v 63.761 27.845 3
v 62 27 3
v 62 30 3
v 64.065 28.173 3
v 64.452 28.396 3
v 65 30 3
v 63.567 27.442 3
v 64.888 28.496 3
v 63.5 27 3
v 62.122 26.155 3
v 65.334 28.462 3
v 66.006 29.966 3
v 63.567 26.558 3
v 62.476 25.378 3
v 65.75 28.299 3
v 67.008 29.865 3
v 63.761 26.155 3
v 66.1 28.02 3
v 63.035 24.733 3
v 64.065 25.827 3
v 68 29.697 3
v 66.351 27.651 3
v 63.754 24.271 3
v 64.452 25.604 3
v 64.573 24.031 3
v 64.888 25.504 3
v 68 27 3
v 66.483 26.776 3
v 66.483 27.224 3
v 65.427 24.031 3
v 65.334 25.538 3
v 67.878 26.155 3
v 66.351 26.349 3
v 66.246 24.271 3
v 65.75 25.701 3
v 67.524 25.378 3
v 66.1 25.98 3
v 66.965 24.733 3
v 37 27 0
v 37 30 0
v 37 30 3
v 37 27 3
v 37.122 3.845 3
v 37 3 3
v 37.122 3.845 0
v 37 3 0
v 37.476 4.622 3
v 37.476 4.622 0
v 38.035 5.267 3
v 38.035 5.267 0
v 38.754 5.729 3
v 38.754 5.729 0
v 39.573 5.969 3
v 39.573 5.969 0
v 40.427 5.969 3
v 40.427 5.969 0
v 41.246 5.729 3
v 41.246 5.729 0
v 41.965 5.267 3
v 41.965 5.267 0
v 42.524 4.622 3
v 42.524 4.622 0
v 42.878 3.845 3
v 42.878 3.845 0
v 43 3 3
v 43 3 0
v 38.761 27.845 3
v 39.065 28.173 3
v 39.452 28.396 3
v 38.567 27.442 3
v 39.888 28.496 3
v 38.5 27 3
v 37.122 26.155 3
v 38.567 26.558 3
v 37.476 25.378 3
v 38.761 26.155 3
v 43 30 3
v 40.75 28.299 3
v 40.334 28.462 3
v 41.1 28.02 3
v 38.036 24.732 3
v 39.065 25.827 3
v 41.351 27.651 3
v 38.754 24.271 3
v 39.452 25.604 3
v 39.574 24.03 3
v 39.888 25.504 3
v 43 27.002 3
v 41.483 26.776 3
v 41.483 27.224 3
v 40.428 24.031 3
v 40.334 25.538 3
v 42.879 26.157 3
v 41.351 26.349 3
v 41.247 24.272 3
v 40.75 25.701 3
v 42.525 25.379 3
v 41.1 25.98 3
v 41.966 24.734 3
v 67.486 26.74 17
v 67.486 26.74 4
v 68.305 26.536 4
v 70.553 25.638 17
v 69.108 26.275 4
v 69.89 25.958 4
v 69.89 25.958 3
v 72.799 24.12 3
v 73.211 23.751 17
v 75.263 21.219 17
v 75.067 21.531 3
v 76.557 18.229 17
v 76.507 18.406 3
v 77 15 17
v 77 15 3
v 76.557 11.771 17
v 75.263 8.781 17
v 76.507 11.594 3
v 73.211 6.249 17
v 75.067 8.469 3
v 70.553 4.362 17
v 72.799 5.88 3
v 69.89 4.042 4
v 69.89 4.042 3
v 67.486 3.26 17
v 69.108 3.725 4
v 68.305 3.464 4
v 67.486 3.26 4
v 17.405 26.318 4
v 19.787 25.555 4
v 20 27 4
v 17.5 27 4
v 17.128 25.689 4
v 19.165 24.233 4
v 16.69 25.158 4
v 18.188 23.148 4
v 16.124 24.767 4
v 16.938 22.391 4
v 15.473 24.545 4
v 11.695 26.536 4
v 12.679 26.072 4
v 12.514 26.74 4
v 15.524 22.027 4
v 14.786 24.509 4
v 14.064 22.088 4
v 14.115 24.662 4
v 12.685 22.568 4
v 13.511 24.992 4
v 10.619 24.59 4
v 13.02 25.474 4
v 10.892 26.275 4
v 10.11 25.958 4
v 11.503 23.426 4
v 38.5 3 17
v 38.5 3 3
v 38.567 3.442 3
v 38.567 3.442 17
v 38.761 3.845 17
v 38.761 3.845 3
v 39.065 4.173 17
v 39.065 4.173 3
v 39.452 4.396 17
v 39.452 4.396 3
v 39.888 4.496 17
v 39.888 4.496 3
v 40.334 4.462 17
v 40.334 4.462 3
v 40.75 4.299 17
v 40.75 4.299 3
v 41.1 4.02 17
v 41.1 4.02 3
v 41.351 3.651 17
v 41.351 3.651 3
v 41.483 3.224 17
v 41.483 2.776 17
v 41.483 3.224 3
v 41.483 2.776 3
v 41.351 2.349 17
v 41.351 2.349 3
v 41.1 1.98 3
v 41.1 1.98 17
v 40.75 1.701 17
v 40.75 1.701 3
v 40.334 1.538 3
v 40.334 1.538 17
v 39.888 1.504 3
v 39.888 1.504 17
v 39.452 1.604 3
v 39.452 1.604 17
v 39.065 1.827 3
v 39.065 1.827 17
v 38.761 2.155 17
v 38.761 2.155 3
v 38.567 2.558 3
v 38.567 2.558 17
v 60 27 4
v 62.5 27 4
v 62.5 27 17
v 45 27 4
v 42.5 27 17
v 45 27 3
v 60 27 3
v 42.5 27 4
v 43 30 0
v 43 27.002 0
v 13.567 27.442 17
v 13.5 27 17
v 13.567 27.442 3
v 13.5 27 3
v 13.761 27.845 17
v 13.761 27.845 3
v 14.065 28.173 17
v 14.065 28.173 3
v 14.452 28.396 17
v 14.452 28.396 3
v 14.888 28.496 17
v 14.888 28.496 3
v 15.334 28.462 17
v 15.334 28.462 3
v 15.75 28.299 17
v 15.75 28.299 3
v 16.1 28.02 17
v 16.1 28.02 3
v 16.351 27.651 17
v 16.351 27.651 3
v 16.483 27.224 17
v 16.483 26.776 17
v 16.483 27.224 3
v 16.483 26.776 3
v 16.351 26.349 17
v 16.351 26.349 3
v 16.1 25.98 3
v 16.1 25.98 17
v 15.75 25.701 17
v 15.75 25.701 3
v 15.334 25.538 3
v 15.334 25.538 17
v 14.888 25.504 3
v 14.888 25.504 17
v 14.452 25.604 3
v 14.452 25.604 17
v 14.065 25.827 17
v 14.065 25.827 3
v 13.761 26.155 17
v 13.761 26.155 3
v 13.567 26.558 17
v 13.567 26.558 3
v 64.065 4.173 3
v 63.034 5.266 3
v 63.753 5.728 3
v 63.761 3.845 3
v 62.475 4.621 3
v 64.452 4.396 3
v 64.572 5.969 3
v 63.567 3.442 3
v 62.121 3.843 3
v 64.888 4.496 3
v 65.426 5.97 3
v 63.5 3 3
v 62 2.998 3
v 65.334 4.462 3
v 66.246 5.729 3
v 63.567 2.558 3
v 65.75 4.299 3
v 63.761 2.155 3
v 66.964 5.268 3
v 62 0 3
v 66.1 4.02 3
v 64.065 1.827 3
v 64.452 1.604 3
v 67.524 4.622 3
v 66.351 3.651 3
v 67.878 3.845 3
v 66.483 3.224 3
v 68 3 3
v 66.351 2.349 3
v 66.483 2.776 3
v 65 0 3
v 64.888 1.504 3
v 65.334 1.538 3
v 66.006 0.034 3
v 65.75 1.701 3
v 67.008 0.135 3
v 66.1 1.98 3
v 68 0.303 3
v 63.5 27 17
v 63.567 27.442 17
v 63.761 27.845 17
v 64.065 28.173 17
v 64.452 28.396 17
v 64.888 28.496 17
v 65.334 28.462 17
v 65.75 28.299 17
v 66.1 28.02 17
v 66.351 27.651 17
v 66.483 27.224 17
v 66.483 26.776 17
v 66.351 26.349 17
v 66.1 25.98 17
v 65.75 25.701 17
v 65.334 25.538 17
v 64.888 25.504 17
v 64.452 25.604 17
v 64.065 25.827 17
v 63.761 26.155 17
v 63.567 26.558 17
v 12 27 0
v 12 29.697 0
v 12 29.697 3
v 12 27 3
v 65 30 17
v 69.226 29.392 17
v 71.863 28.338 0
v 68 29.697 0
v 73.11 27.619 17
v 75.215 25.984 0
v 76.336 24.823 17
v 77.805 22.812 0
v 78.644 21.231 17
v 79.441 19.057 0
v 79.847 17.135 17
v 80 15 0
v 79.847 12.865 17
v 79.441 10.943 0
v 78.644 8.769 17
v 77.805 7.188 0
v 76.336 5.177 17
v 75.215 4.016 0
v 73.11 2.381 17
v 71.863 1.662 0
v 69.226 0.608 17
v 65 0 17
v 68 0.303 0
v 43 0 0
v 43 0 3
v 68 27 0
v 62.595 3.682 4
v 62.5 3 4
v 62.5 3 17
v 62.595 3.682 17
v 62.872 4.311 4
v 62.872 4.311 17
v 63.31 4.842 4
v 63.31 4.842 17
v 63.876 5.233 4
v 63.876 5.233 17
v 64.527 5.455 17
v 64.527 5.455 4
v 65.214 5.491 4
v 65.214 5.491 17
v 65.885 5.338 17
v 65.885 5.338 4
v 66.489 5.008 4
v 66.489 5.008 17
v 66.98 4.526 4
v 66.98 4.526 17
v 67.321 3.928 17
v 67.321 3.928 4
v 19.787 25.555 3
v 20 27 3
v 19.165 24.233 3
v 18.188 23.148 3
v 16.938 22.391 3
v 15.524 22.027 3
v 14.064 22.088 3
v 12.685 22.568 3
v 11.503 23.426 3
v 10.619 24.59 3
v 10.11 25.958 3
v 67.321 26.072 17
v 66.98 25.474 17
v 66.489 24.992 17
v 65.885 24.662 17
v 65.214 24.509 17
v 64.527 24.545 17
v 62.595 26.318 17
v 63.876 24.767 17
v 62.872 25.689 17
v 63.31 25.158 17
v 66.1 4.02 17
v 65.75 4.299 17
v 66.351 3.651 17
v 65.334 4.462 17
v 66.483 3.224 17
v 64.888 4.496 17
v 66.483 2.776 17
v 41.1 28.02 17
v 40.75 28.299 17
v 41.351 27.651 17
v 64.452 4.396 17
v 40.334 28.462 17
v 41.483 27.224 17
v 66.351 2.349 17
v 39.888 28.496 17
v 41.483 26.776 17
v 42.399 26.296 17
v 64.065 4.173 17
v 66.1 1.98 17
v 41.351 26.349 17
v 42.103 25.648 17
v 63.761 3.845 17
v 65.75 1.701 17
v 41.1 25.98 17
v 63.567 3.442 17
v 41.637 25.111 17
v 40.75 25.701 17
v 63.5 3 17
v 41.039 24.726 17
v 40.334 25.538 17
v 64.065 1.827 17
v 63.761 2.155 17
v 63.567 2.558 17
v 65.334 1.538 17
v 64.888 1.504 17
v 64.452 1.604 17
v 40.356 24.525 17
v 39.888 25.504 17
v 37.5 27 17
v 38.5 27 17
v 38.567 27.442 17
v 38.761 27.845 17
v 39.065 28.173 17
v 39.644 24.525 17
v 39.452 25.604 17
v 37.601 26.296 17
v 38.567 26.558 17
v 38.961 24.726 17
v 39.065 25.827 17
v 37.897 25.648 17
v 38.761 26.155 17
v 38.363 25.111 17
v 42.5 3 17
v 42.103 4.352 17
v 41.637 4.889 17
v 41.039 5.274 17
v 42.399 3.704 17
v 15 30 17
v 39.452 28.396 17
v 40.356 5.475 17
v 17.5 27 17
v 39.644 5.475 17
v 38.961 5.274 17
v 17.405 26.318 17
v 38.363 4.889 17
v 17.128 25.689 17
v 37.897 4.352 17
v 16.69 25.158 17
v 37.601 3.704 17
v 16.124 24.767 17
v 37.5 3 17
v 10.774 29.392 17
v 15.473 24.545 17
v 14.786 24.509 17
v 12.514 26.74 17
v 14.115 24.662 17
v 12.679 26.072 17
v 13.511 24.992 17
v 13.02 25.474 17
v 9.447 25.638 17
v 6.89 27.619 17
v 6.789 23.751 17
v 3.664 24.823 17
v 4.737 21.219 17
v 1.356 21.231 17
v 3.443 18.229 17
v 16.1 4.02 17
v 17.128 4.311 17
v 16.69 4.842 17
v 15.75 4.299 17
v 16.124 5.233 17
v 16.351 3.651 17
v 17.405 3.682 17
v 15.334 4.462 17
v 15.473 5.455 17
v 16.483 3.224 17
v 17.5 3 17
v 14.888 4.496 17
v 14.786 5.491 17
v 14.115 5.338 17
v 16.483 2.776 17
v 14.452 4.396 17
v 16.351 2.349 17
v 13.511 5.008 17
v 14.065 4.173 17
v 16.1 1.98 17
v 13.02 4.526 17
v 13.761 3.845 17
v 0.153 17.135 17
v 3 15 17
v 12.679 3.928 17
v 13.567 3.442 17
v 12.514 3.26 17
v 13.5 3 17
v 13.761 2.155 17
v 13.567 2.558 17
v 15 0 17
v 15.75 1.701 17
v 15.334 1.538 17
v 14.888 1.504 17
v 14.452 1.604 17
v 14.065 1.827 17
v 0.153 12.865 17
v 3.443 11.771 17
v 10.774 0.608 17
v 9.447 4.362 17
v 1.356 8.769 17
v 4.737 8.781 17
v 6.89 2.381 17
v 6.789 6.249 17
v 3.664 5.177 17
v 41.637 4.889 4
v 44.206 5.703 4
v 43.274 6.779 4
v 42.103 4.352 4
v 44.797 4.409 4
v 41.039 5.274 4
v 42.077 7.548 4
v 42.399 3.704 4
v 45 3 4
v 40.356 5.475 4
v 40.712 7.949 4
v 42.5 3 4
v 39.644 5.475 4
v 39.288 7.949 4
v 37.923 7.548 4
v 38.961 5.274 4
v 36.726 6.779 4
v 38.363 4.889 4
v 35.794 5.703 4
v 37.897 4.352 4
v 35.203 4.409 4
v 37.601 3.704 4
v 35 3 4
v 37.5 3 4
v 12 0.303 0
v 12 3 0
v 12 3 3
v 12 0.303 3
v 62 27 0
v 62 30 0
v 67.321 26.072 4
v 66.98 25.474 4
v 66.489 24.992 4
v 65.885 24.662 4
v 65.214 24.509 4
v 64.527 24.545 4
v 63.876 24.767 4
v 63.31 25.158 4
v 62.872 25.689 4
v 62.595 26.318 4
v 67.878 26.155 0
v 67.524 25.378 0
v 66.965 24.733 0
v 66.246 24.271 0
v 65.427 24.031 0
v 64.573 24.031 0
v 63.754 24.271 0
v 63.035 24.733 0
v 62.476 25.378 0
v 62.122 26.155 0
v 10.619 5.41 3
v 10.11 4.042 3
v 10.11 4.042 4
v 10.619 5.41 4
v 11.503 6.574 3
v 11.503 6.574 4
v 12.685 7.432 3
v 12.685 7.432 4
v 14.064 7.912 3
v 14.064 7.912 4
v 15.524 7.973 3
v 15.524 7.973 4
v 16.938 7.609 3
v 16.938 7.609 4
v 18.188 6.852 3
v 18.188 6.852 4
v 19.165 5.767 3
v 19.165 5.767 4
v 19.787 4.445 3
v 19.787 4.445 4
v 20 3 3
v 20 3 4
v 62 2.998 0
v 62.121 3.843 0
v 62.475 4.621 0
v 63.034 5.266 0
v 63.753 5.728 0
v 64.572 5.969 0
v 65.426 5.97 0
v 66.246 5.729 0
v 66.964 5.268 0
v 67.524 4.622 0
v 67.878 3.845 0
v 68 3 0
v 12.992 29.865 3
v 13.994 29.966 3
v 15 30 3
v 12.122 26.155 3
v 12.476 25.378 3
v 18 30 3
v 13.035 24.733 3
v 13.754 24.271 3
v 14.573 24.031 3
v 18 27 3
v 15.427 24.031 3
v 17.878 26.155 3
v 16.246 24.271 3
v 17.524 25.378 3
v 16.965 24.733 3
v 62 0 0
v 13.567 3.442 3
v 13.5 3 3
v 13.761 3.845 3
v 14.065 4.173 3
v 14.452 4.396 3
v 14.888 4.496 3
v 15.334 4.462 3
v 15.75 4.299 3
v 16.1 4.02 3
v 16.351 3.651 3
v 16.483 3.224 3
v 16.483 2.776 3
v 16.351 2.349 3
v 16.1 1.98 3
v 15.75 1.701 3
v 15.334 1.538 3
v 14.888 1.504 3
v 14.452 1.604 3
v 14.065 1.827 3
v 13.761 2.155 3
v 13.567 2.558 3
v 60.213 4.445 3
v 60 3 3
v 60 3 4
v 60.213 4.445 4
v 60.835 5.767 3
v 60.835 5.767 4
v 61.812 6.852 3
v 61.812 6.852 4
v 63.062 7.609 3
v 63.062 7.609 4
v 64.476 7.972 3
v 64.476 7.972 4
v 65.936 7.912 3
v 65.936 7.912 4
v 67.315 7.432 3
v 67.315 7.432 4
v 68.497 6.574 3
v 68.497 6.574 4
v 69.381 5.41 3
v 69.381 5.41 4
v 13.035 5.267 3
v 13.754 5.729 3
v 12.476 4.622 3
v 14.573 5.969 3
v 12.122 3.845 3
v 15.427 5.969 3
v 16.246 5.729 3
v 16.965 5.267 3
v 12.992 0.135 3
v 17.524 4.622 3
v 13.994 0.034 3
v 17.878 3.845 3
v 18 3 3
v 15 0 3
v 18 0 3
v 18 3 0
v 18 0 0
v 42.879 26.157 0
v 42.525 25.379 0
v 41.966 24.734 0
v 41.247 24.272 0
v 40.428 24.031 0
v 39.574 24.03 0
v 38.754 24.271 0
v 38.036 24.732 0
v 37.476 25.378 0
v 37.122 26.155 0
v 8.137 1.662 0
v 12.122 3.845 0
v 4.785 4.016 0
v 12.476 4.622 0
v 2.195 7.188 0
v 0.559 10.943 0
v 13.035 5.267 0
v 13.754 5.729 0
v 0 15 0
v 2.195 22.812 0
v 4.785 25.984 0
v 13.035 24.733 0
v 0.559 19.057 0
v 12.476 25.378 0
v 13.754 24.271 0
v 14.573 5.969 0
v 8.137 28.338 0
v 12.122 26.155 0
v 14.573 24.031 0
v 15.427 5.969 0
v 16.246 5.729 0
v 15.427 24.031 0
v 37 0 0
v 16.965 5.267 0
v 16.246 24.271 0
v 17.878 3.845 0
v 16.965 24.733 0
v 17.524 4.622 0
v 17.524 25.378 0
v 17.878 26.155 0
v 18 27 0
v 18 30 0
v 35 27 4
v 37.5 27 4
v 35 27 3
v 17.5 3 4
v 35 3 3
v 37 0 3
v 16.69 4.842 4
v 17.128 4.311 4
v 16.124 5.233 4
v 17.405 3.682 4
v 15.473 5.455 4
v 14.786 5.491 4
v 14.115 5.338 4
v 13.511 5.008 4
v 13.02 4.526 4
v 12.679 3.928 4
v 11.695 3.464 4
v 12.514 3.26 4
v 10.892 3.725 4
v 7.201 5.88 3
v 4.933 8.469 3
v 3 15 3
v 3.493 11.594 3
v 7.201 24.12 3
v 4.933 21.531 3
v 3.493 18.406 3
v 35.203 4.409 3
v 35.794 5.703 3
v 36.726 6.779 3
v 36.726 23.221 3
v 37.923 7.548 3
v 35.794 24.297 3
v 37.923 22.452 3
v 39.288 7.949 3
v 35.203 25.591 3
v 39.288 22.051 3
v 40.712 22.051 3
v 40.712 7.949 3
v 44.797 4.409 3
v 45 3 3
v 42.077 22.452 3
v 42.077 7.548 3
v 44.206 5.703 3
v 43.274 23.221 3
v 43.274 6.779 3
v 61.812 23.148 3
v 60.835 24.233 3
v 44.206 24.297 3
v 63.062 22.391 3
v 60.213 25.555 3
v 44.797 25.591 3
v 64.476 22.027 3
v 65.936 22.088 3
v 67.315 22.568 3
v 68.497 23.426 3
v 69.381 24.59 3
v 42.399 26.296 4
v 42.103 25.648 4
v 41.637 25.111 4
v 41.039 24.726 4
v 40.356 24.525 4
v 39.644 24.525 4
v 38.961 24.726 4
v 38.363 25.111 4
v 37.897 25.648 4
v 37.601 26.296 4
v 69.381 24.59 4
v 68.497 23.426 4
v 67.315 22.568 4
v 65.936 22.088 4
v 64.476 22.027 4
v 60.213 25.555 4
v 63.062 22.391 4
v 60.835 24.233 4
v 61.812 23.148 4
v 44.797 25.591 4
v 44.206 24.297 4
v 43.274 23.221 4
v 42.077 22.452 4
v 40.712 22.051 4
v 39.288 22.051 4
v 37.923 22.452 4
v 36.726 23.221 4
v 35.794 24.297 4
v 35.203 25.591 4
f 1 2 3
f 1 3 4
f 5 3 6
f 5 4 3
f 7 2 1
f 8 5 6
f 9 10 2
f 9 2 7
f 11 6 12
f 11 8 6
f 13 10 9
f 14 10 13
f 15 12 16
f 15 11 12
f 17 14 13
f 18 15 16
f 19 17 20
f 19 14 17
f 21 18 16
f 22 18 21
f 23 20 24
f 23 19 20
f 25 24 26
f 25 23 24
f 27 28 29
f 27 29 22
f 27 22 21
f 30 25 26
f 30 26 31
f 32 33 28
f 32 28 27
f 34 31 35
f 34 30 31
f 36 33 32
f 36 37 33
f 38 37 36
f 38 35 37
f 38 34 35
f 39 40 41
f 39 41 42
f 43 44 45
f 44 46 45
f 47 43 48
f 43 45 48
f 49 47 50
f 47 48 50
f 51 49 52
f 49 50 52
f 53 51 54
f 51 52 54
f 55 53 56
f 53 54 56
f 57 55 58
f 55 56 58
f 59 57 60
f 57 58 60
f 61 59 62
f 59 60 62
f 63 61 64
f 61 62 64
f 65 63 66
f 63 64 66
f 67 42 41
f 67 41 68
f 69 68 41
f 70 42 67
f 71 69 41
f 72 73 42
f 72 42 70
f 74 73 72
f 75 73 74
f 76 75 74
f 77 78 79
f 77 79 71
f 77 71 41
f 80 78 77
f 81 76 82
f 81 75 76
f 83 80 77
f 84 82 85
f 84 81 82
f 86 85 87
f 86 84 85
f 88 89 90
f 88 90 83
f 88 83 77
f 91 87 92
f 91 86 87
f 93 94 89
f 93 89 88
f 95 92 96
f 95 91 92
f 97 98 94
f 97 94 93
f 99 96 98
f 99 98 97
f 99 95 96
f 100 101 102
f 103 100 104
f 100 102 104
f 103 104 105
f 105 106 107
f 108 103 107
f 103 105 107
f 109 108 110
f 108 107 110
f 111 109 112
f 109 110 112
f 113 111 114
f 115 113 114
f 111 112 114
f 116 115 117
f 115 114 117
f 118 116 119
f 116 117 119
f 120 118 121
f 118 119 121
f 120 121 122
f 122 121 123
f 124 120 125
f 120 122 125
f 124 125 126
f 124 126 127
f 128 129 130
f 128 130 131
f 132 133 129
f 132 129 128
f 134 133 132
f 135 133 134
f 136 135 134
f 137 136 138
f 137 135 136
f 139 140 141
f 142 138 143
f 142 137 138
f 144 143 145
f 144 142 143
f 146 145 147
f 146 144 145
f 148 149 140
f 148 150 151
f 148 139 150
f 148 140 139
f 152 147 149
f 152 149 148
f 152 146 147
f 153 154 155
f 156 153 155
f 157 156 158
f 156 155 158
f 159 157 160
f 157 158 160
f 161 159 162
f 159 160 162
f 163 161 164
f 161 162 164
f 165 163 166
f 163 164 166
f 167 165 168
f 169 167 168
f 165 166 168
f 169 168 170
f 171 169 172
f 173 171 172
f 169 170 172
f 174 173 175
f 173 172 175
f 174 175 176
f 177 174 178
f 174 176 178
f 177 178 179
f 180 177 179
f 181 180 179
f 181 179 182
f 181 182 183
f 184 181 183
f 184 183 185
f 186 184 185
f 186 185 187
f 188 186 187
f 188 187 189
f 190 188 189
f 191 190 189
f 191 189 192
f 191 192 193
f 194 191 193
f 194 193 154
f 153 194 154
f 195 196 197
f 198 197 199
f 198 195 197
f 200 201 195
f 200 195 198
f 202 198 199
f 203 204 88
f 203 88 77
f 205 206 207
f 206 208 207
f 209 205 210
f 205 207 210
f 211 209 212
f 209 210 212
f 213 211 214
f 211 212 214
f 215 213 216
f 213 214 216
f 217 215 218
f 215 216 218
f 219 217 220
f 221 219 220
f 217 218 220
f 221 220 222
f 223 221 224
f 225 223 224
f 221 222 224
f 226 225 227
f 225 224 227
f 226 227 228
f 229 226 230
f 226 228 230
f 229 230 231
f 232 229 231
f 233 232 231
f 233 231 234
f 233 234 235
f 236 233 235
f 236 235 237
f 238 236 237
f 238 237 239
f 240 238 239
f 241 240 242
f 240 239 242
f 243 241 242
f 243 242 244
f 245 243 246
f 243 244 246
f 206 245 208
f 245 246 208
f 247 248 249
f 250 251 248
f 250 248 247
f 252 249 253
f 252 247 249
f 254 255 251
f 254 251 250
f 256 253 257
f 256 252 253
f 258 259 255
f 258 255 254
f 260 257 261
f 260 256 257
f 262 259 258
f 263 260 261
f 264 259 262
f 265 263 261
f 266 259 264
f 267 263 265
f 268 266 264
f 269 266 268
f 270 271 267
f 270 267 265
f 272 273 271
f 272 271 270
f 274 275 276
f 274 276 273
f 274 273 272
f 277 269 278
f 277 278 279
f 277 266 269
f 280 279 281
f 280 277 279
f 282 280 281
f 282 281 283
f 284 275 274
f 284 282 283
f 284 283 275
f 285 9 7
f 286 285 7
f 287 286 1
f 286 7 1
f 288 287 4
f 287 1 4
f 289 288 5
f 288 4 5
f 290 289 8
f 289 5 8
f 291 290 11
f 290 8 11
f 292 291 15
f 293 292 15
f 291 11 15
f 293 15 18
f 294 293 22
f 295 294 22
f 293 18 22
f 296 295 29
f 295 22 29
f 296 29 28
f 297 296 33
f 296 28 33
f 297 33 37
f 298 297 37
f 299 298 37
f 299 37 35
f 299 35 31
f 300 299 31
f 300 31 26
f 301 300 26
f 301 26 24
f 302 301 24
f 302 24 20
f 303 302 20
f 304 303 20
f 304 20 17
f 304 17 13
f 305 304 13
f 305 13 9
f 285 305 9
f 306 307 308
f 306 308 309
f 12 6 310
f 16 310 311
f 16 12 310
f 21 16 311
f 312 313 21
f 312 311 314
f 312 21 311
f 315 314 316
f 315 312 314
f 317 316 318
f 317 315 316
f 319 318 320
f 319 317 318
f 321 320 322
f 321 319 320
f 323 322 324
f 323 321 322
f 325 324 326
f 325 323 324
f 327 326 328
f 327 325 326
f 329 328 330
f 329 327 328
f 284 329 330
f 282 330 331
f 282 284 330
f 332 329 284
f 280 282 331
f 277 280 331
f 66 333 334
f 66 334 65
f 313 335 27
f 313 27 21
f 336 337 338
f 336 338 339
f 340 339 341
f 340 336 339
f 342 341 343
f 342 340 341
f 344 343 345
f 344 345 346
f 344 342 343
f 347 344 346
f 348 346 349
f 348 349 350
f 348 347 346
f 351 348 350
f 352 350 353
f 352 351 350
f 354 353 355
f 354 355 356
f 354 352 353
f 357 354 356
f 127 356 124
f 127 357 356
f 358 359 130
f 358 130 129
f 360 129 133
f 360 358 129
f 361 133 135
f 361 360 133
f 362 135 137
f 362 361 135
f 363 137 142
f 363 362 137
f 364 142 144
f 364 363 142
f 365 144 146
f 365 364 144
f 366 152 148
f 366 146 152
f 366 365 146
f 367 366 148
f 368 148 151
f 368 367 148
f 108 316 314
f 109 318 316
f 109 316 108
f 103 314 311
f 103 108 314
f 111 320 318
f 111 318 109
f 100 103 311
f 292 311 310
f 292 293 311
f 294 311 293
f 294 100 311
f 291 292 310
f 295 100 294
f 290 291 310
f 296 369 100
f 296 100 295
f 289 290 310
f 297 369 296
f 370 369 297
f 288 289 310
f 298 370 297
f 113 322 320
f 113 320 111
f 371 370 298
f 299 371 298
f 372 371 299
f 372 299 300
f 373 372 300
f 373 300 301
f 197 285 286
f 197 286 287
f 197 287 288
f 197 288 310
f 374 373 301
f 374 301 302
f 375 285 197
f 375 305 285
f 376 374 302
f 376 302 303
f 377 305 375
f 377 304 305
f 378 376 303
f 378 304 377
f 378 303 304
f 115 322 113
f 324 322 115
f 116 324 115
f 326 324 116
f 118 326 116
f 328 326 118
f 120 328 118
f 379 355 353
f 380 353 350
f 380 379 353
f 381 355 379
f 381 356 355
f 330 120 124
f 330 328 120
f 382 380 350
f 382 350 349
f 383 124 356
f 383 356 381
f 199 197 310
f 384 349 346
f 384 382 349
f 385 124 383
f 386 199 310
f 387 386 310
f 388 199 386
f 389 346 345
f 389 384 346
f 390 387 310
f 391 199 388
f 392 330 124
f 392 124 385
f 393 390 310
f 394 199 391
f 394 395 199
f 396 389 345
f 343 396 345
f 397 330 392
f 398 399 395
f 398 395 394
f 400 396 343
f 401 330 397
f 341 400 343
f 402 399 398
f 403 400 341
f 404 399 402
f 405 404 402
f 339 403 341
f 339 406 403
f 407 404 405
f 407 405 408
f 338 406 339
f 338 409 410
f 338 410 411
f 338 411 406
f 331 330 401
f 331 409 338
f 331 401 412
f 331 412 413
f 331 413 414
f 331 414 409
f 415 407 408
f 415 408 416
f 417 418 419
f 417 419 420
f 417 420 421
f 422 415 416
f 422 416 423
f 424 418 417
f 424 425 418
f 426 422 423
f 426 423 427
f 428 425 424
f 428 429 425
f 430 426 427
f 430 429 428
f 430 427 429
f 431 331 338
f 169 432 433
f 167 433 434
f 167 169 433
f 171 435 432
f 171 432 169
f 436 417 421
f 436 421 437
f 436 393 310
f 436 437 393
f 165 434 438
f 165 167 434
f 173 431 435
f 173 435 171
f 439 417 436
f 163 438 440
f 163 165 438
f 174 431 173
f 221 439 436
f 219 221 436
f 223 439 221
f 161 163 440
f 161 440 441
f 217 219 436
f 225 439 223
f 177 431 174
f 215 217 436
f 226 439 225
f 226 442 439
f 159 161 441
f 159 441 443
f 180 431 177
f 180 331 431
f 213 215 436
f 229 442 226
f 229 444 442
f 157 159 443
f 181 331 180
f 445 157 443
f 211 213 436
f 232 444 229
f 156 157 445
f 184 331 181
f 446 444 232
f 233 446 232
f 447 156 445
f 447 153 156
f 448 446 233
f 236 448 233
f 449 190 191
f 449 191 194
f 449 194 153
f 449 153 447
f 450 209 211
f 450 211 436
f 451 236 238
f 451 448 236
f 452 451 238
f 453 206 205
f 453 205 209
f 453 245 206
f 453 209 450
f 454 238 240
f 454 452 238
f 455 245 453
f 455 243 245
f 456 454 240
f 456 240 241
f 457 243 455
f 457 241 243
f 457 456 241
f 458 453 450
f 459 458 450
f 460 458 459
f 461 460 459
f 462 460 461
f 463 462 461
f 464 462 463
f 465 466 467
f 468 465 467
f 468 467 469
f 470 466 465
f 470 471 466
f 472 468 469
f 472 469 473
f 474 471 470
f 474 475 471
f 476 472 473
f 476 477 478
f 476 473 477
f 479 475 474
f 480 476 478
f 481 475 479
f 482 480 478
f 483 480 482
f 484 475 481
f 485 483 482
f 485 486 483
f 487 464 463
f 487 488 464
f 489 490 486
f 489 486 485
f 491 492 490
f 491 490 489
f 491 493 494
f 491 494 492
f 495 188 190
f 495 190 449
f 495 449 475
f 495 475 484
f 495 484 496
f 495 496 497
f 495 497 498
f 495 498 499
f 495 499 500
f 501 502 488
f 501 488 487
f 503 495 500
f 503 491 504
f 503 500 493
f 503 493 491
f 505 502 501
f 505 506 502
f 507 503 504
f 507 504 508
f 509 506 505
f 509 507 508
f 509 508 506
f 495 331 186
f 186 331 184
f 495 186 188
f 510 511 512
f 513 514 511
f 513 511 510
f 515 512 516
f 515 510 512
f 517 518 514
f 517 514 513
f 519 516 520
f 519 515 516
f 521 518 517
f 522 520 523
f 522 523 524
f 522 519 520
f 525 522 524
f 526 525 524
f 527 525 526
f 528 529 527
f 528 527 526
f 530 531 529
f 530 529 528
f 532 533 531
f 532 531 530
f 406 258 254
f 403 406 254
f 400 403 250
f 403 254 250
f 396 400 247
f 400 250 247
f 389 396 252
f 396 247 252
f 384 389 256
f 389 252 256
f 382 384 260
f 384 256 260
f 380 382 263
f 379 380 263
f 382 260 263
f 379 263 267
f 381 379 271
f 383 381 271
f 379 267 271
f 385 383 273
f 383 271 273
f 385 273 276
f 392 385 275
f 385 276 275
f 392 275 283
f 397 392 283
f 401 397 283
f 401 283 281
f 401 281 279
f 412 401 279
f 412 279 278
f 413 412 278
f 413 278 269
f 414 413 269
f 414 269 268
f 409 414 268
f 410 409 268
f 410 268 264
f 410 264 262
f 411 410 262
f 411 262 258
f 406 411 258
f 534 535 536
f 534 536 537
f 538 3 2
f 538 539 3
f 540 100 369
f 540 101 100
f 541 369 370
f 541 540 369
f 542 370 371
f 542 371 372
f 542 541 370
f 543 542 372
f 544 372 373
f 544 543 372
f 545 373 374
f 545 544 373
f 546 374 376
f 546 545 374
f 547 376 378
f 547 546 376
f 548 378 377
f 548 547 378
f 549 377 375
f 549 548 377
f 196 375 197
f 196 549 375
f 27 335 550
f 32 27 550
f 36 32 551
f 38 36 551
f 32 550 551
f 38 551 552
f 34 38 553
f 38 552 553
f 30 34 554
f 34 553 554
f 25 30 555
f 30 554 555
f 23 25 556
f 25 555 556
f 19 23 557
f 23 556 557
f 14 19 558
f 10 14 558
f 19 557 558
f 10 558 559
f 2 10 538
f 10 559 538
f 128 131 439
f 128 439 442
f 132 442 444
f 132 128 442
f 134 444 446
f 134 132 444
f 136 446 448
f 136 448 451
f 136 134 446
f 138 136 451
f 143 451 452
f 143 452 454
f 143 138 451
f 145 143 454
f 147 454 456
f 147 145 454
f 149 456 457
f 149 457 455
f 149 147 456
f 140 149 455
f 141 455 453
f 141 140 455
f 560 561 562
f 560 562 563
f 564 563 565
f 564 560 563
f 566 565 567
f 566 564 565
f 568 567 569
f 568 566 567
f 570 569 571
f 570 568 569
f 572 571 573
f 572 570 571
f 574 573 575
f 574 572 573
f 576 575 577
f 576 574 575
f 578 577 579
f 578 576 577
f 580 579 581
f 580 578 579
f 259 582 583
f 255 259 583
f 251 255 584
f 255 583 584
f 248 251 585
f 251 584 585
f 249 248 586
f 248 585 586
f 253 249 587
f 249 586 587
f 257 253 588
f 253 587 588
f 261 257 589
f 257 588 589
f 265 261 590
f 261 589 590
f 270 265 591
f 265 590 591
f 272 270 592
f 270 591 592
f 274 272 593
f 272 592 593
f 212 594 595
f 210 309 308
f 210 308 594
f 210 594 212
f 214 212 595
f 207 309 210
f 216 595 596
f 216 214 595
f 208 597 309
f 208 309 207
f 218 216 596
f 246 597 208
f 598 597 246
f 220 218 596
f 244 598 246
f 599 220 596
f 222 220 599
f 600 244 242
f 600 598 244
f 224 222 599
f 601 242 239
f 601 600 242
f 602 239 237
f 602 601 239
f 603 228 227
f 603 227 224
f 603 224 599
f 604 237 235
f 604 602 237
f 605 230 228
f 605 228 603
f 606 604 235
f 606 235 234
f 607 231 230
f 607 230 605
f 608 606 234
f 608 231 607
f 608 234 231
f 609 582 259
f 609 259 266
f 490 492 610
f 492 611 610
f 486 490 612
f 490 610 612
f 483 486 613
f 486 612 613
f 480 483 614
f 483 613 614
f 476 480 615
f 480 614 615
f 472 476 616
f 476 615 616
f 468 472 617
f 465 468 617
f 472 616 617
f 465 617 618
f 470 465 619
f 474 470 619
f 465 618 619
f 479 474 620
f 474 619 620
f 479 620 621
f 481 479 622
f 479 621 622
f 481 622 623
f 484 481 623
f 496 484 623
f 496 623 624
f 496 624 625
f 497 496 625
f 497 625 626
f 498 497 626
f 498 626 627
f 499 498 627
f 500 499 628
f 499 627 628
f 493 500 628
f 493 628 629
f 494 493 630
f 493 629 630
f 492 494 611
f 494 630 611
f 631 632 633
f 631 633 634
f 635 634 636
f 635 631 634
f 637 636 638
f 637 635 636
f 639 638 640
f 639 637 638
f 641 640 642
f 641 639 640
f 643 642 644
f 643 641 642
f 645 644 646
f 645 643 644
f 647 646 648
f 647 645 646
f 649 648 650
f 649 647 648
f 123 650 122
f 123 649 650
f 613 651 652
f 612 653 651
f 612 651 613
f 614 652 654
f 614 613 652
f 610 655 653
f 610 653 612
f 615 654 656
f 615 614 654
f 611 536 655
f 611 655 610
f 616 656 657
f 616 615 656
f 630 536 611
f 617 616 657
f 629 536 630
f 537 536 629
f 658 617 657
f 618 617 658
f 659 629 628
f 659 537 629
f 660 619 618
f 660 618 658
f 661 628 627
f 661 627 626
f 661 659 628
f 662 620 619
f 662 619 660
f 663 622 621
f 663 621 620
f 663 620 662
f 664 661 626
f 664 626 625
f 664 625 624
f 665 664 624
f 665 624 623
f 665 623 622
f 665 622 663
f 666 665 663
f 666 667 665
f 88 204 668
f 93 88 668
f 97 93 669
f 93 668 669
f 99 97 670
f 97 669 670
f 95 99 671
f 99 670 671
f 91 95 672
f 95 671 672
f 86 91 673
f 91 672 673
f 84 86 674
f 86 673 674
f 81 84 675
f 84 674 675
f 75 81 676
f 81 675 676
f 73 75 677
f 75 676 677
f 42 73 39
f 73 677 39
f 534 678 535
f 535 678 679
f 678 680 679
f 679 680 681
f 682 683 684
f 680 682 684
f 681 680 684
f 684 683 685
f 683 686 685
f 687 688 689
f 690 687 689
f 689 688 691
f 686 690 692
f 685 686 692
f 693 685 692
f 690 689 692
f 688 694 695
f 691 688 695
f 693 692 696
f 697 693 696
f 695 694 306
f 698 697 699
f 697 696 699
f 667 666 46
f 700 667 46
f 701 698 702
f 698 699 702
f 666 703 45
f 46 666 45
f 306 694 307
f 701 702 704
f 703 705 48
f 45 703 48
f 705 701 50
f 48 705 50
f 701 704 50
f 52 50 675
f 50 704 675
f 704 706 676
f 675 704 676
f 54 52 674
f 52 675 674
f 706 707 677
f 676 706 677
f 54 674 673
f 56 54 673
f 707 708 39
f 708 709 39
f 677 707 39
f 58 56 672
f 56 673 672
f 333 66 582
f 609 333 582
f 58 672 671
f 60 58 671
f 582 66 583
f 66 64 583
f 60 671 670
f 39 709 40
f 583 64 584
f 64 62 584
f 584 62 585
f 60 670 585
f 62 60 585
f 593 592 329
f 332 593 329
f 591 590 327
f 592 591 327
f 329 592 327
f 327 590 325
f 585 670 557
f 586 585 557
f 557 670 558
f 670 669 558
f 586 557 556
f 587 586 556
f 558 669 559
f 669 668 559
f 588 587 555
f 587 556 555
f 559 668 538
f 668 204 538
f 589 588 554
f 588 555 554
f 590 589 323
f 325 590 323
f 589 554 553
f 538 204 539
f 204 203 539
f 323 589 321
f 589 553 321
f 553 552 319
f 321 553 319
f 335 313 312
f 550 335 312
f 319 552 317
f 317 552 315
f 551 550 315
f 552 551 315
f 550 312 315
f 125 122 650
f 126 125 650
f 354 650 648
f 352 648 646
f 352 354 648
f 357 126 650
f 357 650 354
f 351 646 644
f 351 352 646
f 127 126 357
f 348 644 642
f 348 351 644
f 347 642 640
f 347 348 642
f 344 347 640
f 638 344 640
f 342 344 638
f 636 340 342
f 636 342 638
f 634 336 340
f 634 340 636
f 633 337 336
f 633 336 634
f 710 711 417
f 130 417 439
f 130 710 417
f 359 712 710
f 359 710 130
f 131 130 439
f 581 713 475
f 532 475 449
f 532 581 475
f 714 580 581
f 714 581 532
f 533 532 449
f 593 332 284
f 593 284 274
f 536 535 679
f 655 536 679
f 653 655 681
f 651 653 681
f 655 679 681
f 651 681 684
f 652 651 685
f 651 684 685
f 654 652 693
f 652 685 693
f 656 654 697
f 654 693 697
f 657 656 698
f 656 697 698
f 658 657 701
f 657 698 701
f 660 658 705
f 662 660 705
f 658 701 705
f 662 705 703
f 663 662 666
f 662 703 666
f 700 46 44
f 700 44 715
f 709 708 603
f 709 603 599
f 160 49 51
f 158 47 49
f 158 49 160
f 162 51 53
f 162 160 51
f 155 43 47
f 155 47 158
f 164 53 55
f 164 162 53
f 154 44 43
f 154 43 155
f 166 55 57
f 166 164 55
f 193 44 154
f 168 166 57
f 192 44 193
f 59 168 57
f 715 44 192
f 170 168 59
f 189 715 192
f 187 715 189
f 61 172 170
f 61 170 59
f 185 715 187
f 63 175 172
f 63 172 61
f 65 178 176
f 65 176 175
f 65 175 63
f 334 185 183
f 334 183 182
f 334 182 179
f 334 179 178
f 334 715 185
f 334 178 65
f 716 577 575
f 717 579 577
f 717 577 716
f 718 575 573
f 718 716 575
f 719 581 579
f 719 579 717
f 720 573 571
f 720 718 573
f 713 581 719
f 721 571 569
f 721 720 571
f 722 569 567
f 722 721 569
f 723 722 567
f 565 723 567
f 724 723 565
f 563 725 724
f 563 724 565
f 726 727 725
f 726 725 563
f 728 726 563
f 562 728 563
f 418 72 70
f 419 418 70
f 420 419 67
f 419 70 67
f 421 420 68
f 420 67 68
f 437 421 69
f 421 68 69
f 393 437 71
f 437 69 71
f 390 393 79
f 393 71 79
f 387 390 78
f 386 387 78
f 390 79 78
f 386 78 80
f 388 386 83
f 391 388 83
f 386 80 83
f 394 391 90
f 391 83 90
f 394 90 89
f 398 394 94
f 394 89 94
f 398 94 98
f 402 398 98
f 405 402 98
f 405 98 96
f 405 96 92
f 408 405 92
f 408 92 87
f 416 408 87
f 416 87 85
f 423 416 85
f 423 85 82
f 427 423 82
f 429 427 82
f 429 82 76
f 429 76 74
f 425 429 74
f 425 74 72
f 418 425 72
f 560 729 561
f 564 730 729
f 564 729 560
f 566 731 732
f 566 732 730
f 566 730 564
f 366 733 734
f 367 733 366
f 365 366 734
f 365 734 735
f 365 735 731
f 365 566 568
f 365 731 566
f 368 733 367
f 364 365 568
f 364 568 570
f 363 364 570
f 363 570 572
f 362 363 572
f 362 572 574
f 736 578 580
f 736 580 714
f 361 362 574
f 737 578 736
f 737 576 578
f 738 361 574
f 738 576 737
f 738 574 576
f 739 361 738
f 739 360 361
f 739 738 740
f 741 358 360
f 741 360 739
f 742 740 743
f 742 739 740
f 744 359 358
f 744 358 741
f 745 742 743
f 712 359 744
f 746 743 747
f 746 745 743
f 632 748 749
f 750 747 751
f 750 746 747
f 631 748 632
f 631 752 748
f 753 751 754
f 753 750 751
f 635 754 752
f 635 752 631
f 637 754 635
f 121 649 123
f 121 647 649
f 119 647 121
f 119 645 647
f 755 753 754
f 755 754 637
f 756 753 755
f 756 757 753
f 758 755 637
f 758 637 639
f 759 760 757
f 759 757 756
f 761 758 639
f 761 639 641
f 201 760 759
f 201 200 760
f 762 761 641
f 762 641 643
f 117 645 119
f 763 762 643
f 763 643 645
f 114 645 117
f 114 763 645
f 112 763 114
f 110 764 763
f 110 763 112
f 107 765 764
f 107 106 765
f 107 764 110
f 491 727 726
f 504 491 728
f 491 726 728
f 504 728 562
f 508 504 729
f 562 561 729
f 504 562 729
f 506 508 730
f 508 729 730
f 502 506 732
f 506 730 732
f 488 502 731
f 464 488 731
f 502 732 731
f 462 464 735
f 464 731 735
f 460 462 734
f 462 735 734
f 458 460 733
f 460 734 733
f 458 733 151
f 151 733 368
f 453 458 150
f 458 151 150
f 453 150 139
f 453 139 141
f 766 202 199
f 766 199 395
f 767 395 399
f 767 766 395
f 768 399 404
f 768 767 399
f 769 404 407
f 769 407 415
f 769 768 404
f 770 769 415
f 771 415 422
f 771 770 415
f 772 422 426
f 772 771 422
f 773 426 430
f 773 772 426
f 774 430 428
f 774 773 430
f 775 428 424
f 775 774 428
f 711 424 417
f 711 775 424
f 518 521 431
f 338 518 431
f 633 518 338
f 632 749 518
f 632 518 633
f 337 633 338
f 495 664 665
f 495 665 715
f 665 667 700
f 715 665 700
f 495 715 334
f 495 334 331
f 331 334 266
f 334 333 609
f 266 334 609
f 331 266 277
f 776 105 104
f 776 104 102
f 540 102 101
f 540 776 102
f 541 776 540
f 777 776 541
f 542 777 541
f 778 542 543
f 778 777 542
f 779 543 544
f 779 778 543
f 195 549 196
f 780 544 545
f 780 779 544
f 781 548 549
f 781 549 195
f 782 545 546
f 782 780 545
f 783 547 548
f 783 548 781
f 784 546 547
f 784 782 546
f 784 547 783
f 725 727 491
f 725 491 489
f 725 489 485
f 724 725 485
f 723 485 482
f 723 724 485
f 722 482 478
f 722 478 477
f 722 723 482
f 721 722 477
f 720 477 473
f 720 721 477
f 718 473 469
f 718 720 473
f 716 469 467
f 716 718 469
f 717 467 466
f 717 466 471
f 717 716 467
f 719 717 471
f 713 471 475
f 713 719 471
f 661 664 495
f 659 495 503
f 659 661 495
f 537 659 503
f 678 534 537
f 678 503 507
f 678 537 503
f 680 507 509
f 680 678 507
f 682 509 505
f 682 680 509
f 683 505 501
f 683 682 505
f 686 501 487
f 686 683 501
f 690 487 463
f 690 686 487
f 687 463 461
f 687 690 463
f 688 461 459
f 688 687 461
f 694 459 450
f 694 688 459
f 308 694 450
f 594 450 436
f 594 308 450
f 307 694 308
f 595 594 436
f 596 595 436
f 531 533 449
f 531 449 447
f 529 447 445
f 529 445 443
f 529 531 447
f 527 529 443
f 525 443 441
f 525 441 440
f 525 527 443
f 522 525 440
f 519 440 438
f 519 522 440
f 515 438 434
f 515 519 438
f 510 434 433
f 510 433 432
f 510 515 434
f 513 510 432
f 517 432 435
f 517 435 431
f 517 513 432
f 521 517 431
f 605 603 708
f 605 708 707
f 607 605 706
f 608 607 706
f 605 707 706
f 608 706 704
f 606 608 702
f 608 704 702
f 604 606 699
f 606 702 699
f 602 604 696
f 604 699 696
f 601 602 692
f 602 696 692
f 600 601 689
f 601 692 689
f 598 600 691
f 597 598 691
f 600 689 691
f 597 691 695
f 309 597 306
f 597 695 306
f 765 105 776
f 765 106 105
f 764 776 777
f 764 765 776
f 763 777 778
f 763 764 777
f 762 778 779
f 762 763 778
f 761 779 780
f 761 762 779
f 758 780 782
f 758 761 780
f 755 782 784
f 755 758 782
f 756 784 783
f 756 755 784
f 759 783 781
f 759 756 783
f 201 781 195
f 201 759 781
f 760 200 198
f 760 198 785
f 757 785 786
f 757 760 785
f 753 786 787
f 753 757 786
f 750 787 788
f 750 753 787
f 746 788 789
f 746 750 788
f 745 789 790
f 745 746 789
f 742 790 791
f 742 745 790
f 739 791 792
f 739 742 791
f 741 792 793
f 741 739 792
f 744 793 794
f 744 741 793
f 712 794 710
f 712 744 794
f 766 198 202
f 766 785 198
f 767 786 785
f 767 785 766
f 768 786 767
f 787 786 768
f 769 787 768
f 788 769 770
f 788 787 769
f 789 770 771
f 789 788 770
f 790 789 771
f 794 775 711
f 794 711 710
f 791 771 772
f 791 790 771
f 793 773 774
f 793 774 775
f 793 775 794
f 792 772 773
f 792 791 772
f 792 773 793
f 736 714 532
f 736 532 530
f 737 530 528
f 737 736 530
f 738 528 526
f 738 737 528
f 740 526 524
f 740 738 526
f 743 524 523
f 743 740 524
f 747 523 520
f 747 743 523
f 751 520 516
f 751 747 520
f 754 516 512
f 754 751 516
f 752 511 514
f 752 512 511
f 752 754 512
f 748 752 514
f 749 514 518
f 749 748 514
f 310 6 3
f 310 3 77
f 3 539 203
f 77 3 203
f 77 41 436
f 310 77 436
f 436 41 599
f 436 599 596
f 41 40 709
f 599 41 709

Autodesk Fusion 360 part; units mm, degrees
sketch "Sketch1" plane through (0, 0, 0) normal (0, 0, 1) x (1, 0, 0)
  line L0 (15, 0) -> (65.0001, 0)
  line L1 (65.0001, 30) -> (15, 30)
  arc A0 (65.0001, 0) -> (65.0001, 30) centre (65, 15) ccw
  arc A1 (15, 30) -> (15, 0) centre (15, 15) ccw
  line L2 (0, 0) -> (0, 40.5539) construction
  line L3 (0, 0) -> (80, 0) construction
  dimension "d9" = 15
  dimension "d10" = 50
extrude "Extrude1" add sketch "Sketch1" along normal blind 3
sketch "Sketch2" plane through (0, 0, 3) normal (0, 0, 1) x (-1, 0, 0)
  arc A0 (-15, -30) -> (-15, 0) centre (-15, -15) ccw
  line L0 (-15, 0) -> (-65.0001, 0)
  arc A1 (-65.0001, 0) -> (-65.0001, -30) centre (-65, -15) ccw
  line L1 (-65.0001, -30) -> (-15, -30)
  arc A2 (-65.0001, -3) -> (-65, -27) centre (-65, -15) ccw
  line L2 (-65, -27) -> (-15, -27)
  arc A3 (-15, -27) -> (-15, -3) centre (-15, -15) ccw
  line L3 (-15, -3) -> (-65.0001, -3)
  line L4 (-65, -15) -> (-65.0001, 0) construction
  line L5 (-65.0001, 0) -> (-15.0001, 0.0002) construction
  line L6 (-15.0001, 0.0002) -> (-15, -15) construction
  line L7 (-15, -15) -> (-65, -15) construction
  arc A4 (-69.8903, -4.0417) -> (-60.0001, -3) centre (-65.0001, -3) ccw
  arc A5 (-45, -3) -> (-35, -3) centre (-40, -3.0001) ccw
  arc A6 (-20, -3) -> (-10.1097, -4.0417) centre (-15, -3) ccw
  arc A7 (-18.9998, 0.0002) -> (-19, 0) centre (-15, -3) ccw
  arc A8 (-20, -3) -> (-10.1097, -4.0417) centre (-15, -3) ccw
  arc A9 (-45, -3) -> (-35, -3) centre (-40, -3.0001) ccw
  arc A10 (-69.8903, -4.0417) -> (-60.0001, -3) centre (-65.0001, -3) ccw
  line L8 (-15.0001, -14.9998) -> (-15, -30) construction
  line L9 (-15, -30) -> (-15.9207, -30) construction
  line L10 (-15, -30) -> (-65, -30) construction
  arc A11 (-35, -27) -> (-45, -27) centre (-40, -27) ccw
  arc A12 (-10.1097, -25.9583) -> (-20, -27) centre (-15, -27) ccw
  arc A13 (-60, -27) -> (-69.8903, -25.9583) centre (-65, -27) ccw
  circle A14 centre (-15, -27) radius 1.5
  circle A15 centre (-40, -27) radius 1.5
  circle A16 centre (-65, -27) radius 1.5
  circle A17 centre (-15, -3) radius 1.5
  circle A18 centre (-40, -3) radius 1.5
  circle A19 centre (-65, -3) radius 1.5
  circle A20 centre (-40, -3) radius 2.5
  circle A21 centre (-65, -3) radius 2.5
  circle A22 centre (-65, -27) radius 2.5
  circle A23 centre (-40, -27) radius 2.5
  circle A24 centre (-15, -27) radius 2.5
  circle A25 centre (-15, -3) radius 2.5
  dimension "d13" = -3
  dimension "d44" = 10
  dimension "d47" = 10
  dimension "d48" = 10
  dimension "d51" = 10
  dimension "d52" = 10
  dimension "d53" = 10
  dimension "d55" = 10
  dimension "d56" = 10
  dimension "d57" = 10
  dimension "d60" = 3
  dimension "d61" = 3
  dimension "d62" = 3
  dimension "d63" = 3
  dimension "d64" = 3
  dimension "d65" = 3
  dimension "d66" = 1
  dimension "d67" = 1
  dimension "d68" = 1
  dimension "d69" = 1
  dimension "d70" = 1
  dimension "d71" = 1
extrude "Extrude2" add sketch "Sketch2" along normal blind 14 contours A0 L0 A1 L1 A2 L2 A3 L3 A7 A20 A21 A22 A23 A24 | A0 L0 A3 L3 A7 A25 | A3 L3 A17 A25 | L2 A3 A14 A24 | A3 L3 A17 | L3 A18 A20 | L2 A3 A14 | L3 A18 | L2 A15 A23 | A2 L3 A19 A21 | L2 A15 | A2 L3 A19 | A2 L2 A16 A22 | A2 L2 A16 picked at (-13.0721, -2.848) picked at (-13.0721, -27.152) picked at (-14.6506, -2.538) picked at (-42.1518, -2.8013) picked at (-14.6506, -27.462) picked at (-40.339, -2.2448) picked at (-42.1518, -27.1987) picked at (-66.9146, -2.7753) picked at (-39.7775, -27.9749) picked at (-65.3253, -2.5293) picked at (-66.9146, -27.2247) picked at (-65.3252, -27.4707)
sketch "Sketch3" plane through (0, 0, 0) normal (0, 0, -1) x (1, 0, 0)
  arc A0 (15, 0) -> (15, -30) centre (15, -15) ccw
  line L0 (15, -30) -> (65.0001, -30)
  arc A1 (65.0001, -30) -> (65.0001, 0) centre (65, -15) ccw
  line L1 (65.0001, 0) -> (15, 0)
  line L2 (65, -15) -> (65.0001, 0) construction
  line L3 (65, -15) -> (15, -15) construction
  line L4 (15, -15) -> (15, 0) construction
  line L5 (15, 0) -> (65.0001, 0) construction
  line L6 (15, 0) -> (15, -3) construction
  line L7 (18, -3) -> (18, 0) construction
  line L8 (18, 0) -> (12, 0) construction
  line L9 (12, 0) -> (12, -3) construction
  line L10 (12, -3) -> (12, 0) construction
  line L11 (15, 0) -> (18, 0) construction
  line L12 (18, 0) -> (18, -3) construction
  line L13 (12, -3) -> (12, 0)
  line L14 (12, 0) -> (18, 0)
  line L15 (18, 0) -> (18, -3)
  arc A2 (12, -3) -> (18, -3) centre (15, -3) ccw
  line L16 (40, -3) -> (43, -3) construction
  line L17 (43, 0) -> (37, 0) construction
  line L18 (37, 0) -> (43, 0)
  line L19 (43, 0) -> (43, -3)
  line L20 (37, -3) -> (37, 0)
  arc A3 (37, -2.998) -> (43, -3) centre (40, -3) ccw
  line L21 (65, -3) -> (68, -3) construction
  arc A4 (65.0066, 0) -> (64.9934, 0) centre (65, -3) ccw
  arc A5 (68, -27) -> (62, -27) centre (65, -27) ccw
  line L22 (62, -30) -> (62, -27)
  line L23 (68, -27) -> (68, -30)
  arc A6 (43, -27.002) -> (37, -27) centre (40, -27) ccw
  line L24 (43, -27) -> (43, -30)
  line L25 (37, -30) -> (37, -27)
  line L26 (18, -27) -> (18, -30)
  arc A7 (18, -27.0025) -> (12, -27) centre (15, -27) ccw
  line L27 (12, -30) -> (12, -27)
  line L28 (68, 0) -> (68, -3)
  arc A8 (62, -2.998) -> (68, -3) centre (65, -3) ccw
  line L29 (62, -3) -> (62, 0)
  line L30 (62, 0) -> (68, 0)
  dimension "d16" = 6
  dimension "d17" = 6
  dimension "d23" = 6
  dimension "d25" = 6
  dimension "d27" = 6
  dimension "d28" = 6
  dimension "d29" = 6
  dimension "d40" = 6
extrude "Extrude3" cut sketch "Sketch3" against normal blind 3 contours A0 L1 L13 L14 L15 A2
extrude "Extrude4" cut sketch "Sketch3" against normal blind 3 contours L1 L18 L19 L20 A3
extrude "Extrude5" cut sketch "Sketch3" against normal blind 3 contours L0 A6 L24 L25
extrude "Extrude6" cut sketch "Sketch3" against normal blind 3 contours A0 L0 L26 A7 L27
extrude "Extrude7" cut sketch "Sketch3" against normal blind 3 contours L0 A1 A5 L22 L23
extrude "Extrude8" cut sketch "Sketch3" against normal blind 3 contours A1 L1 A4 L28 A8 L29 L30
extrude "Extrude9" add sketch "Sketch2" along normal blind 1 contours A2 L3 A4 A10 A21 | A2 L3 A19 A21 | A2 L3 A19 picked at (-66.8477, -3.5405) picked at (-65.3313, -3.4756)
extrude "Extrude10" add sketch "Sketch2" along normal blind 1 contours A3 L3 A6 A7 A8 A25 | A3 L3 A17 A25 | L3 A5 A9 A20 | A3 L3 A17 | L3 A18 A20 | L3 A18 picked at (-13.1523, -3.5405) picked at (-14.6688, -3.4756) picked at (-42.1574, -3.1242) picked at (-40.3832, -3.562)
extrude "Extrude11" add sketch "Sketch2" along normal blind 1 contours L2 A3 A12 A24 | L2 A3 A14 A24 | L2 A3 A14 | L2 A11 A23 | L2 A15 A23 | L2 A15 | A2 L2 A13 A22 | A2 L2 A16 A22 | A2 L2 A16 picked at (-13.1523, -26.4595) picked at (-14.6688, -26.5244) picked at (-42.1574, -26.8758) picked at (-39.6335, -26.6599) picked at (-66.8477, -26.4595) picked at (-65.3313, -26.5244)
extrude "Extrude12" add sketch "Sketch2" along normal blind 14 contours A3 L3 A17 A25 | A3 L3 A17 A25 | A3 L3 A17 | A3 L3 A17
extrude "Extrude13" cut sketch "Sketch2" along normal blind 15 contours A3 L3 A17 | A3 L3 A17
extrude "Extrude14" add sketch "Sketch2" along normal blind 14 contours A3 L3 A17 A25 | A3 L3 A17 A25 | L2 A3 A14 A24 | L2 A3 A14 A24 | A3 L3 A17 | A3 L3 A17 | L3 A18 A20 | L3 A18 A20 | L2 A3 A14 | L2 A3 A14 | L3 A18 | L3 A18 | L2 A15 A23 | L2 A15 A23 | A2 L3 A19 A21 | A2 L3 A19 A21 | L2 A15 | L2 A15 | A2 L3 A19 | A2 L3 A19
extrude "Extrude15" add sketch "Sketch2" along normal blind 14 contours A2 L2 A16 A22 | A2 L2 A16 A22 | A2 L2 A16 | A2 L2 A16
extrude "Extrude16" cut sketch "Sketch2" along normal blind 15 contours A3 L3 A17 | A3 L3 A17 | L2 A3 A14 | L2 A3 A14 | L3 A18 | L3 A18 | L2 A15 | L2 A15 | A2 L3 A19 | A2 L3 A19 | A2 L2 A16 | A2 L2 A16
